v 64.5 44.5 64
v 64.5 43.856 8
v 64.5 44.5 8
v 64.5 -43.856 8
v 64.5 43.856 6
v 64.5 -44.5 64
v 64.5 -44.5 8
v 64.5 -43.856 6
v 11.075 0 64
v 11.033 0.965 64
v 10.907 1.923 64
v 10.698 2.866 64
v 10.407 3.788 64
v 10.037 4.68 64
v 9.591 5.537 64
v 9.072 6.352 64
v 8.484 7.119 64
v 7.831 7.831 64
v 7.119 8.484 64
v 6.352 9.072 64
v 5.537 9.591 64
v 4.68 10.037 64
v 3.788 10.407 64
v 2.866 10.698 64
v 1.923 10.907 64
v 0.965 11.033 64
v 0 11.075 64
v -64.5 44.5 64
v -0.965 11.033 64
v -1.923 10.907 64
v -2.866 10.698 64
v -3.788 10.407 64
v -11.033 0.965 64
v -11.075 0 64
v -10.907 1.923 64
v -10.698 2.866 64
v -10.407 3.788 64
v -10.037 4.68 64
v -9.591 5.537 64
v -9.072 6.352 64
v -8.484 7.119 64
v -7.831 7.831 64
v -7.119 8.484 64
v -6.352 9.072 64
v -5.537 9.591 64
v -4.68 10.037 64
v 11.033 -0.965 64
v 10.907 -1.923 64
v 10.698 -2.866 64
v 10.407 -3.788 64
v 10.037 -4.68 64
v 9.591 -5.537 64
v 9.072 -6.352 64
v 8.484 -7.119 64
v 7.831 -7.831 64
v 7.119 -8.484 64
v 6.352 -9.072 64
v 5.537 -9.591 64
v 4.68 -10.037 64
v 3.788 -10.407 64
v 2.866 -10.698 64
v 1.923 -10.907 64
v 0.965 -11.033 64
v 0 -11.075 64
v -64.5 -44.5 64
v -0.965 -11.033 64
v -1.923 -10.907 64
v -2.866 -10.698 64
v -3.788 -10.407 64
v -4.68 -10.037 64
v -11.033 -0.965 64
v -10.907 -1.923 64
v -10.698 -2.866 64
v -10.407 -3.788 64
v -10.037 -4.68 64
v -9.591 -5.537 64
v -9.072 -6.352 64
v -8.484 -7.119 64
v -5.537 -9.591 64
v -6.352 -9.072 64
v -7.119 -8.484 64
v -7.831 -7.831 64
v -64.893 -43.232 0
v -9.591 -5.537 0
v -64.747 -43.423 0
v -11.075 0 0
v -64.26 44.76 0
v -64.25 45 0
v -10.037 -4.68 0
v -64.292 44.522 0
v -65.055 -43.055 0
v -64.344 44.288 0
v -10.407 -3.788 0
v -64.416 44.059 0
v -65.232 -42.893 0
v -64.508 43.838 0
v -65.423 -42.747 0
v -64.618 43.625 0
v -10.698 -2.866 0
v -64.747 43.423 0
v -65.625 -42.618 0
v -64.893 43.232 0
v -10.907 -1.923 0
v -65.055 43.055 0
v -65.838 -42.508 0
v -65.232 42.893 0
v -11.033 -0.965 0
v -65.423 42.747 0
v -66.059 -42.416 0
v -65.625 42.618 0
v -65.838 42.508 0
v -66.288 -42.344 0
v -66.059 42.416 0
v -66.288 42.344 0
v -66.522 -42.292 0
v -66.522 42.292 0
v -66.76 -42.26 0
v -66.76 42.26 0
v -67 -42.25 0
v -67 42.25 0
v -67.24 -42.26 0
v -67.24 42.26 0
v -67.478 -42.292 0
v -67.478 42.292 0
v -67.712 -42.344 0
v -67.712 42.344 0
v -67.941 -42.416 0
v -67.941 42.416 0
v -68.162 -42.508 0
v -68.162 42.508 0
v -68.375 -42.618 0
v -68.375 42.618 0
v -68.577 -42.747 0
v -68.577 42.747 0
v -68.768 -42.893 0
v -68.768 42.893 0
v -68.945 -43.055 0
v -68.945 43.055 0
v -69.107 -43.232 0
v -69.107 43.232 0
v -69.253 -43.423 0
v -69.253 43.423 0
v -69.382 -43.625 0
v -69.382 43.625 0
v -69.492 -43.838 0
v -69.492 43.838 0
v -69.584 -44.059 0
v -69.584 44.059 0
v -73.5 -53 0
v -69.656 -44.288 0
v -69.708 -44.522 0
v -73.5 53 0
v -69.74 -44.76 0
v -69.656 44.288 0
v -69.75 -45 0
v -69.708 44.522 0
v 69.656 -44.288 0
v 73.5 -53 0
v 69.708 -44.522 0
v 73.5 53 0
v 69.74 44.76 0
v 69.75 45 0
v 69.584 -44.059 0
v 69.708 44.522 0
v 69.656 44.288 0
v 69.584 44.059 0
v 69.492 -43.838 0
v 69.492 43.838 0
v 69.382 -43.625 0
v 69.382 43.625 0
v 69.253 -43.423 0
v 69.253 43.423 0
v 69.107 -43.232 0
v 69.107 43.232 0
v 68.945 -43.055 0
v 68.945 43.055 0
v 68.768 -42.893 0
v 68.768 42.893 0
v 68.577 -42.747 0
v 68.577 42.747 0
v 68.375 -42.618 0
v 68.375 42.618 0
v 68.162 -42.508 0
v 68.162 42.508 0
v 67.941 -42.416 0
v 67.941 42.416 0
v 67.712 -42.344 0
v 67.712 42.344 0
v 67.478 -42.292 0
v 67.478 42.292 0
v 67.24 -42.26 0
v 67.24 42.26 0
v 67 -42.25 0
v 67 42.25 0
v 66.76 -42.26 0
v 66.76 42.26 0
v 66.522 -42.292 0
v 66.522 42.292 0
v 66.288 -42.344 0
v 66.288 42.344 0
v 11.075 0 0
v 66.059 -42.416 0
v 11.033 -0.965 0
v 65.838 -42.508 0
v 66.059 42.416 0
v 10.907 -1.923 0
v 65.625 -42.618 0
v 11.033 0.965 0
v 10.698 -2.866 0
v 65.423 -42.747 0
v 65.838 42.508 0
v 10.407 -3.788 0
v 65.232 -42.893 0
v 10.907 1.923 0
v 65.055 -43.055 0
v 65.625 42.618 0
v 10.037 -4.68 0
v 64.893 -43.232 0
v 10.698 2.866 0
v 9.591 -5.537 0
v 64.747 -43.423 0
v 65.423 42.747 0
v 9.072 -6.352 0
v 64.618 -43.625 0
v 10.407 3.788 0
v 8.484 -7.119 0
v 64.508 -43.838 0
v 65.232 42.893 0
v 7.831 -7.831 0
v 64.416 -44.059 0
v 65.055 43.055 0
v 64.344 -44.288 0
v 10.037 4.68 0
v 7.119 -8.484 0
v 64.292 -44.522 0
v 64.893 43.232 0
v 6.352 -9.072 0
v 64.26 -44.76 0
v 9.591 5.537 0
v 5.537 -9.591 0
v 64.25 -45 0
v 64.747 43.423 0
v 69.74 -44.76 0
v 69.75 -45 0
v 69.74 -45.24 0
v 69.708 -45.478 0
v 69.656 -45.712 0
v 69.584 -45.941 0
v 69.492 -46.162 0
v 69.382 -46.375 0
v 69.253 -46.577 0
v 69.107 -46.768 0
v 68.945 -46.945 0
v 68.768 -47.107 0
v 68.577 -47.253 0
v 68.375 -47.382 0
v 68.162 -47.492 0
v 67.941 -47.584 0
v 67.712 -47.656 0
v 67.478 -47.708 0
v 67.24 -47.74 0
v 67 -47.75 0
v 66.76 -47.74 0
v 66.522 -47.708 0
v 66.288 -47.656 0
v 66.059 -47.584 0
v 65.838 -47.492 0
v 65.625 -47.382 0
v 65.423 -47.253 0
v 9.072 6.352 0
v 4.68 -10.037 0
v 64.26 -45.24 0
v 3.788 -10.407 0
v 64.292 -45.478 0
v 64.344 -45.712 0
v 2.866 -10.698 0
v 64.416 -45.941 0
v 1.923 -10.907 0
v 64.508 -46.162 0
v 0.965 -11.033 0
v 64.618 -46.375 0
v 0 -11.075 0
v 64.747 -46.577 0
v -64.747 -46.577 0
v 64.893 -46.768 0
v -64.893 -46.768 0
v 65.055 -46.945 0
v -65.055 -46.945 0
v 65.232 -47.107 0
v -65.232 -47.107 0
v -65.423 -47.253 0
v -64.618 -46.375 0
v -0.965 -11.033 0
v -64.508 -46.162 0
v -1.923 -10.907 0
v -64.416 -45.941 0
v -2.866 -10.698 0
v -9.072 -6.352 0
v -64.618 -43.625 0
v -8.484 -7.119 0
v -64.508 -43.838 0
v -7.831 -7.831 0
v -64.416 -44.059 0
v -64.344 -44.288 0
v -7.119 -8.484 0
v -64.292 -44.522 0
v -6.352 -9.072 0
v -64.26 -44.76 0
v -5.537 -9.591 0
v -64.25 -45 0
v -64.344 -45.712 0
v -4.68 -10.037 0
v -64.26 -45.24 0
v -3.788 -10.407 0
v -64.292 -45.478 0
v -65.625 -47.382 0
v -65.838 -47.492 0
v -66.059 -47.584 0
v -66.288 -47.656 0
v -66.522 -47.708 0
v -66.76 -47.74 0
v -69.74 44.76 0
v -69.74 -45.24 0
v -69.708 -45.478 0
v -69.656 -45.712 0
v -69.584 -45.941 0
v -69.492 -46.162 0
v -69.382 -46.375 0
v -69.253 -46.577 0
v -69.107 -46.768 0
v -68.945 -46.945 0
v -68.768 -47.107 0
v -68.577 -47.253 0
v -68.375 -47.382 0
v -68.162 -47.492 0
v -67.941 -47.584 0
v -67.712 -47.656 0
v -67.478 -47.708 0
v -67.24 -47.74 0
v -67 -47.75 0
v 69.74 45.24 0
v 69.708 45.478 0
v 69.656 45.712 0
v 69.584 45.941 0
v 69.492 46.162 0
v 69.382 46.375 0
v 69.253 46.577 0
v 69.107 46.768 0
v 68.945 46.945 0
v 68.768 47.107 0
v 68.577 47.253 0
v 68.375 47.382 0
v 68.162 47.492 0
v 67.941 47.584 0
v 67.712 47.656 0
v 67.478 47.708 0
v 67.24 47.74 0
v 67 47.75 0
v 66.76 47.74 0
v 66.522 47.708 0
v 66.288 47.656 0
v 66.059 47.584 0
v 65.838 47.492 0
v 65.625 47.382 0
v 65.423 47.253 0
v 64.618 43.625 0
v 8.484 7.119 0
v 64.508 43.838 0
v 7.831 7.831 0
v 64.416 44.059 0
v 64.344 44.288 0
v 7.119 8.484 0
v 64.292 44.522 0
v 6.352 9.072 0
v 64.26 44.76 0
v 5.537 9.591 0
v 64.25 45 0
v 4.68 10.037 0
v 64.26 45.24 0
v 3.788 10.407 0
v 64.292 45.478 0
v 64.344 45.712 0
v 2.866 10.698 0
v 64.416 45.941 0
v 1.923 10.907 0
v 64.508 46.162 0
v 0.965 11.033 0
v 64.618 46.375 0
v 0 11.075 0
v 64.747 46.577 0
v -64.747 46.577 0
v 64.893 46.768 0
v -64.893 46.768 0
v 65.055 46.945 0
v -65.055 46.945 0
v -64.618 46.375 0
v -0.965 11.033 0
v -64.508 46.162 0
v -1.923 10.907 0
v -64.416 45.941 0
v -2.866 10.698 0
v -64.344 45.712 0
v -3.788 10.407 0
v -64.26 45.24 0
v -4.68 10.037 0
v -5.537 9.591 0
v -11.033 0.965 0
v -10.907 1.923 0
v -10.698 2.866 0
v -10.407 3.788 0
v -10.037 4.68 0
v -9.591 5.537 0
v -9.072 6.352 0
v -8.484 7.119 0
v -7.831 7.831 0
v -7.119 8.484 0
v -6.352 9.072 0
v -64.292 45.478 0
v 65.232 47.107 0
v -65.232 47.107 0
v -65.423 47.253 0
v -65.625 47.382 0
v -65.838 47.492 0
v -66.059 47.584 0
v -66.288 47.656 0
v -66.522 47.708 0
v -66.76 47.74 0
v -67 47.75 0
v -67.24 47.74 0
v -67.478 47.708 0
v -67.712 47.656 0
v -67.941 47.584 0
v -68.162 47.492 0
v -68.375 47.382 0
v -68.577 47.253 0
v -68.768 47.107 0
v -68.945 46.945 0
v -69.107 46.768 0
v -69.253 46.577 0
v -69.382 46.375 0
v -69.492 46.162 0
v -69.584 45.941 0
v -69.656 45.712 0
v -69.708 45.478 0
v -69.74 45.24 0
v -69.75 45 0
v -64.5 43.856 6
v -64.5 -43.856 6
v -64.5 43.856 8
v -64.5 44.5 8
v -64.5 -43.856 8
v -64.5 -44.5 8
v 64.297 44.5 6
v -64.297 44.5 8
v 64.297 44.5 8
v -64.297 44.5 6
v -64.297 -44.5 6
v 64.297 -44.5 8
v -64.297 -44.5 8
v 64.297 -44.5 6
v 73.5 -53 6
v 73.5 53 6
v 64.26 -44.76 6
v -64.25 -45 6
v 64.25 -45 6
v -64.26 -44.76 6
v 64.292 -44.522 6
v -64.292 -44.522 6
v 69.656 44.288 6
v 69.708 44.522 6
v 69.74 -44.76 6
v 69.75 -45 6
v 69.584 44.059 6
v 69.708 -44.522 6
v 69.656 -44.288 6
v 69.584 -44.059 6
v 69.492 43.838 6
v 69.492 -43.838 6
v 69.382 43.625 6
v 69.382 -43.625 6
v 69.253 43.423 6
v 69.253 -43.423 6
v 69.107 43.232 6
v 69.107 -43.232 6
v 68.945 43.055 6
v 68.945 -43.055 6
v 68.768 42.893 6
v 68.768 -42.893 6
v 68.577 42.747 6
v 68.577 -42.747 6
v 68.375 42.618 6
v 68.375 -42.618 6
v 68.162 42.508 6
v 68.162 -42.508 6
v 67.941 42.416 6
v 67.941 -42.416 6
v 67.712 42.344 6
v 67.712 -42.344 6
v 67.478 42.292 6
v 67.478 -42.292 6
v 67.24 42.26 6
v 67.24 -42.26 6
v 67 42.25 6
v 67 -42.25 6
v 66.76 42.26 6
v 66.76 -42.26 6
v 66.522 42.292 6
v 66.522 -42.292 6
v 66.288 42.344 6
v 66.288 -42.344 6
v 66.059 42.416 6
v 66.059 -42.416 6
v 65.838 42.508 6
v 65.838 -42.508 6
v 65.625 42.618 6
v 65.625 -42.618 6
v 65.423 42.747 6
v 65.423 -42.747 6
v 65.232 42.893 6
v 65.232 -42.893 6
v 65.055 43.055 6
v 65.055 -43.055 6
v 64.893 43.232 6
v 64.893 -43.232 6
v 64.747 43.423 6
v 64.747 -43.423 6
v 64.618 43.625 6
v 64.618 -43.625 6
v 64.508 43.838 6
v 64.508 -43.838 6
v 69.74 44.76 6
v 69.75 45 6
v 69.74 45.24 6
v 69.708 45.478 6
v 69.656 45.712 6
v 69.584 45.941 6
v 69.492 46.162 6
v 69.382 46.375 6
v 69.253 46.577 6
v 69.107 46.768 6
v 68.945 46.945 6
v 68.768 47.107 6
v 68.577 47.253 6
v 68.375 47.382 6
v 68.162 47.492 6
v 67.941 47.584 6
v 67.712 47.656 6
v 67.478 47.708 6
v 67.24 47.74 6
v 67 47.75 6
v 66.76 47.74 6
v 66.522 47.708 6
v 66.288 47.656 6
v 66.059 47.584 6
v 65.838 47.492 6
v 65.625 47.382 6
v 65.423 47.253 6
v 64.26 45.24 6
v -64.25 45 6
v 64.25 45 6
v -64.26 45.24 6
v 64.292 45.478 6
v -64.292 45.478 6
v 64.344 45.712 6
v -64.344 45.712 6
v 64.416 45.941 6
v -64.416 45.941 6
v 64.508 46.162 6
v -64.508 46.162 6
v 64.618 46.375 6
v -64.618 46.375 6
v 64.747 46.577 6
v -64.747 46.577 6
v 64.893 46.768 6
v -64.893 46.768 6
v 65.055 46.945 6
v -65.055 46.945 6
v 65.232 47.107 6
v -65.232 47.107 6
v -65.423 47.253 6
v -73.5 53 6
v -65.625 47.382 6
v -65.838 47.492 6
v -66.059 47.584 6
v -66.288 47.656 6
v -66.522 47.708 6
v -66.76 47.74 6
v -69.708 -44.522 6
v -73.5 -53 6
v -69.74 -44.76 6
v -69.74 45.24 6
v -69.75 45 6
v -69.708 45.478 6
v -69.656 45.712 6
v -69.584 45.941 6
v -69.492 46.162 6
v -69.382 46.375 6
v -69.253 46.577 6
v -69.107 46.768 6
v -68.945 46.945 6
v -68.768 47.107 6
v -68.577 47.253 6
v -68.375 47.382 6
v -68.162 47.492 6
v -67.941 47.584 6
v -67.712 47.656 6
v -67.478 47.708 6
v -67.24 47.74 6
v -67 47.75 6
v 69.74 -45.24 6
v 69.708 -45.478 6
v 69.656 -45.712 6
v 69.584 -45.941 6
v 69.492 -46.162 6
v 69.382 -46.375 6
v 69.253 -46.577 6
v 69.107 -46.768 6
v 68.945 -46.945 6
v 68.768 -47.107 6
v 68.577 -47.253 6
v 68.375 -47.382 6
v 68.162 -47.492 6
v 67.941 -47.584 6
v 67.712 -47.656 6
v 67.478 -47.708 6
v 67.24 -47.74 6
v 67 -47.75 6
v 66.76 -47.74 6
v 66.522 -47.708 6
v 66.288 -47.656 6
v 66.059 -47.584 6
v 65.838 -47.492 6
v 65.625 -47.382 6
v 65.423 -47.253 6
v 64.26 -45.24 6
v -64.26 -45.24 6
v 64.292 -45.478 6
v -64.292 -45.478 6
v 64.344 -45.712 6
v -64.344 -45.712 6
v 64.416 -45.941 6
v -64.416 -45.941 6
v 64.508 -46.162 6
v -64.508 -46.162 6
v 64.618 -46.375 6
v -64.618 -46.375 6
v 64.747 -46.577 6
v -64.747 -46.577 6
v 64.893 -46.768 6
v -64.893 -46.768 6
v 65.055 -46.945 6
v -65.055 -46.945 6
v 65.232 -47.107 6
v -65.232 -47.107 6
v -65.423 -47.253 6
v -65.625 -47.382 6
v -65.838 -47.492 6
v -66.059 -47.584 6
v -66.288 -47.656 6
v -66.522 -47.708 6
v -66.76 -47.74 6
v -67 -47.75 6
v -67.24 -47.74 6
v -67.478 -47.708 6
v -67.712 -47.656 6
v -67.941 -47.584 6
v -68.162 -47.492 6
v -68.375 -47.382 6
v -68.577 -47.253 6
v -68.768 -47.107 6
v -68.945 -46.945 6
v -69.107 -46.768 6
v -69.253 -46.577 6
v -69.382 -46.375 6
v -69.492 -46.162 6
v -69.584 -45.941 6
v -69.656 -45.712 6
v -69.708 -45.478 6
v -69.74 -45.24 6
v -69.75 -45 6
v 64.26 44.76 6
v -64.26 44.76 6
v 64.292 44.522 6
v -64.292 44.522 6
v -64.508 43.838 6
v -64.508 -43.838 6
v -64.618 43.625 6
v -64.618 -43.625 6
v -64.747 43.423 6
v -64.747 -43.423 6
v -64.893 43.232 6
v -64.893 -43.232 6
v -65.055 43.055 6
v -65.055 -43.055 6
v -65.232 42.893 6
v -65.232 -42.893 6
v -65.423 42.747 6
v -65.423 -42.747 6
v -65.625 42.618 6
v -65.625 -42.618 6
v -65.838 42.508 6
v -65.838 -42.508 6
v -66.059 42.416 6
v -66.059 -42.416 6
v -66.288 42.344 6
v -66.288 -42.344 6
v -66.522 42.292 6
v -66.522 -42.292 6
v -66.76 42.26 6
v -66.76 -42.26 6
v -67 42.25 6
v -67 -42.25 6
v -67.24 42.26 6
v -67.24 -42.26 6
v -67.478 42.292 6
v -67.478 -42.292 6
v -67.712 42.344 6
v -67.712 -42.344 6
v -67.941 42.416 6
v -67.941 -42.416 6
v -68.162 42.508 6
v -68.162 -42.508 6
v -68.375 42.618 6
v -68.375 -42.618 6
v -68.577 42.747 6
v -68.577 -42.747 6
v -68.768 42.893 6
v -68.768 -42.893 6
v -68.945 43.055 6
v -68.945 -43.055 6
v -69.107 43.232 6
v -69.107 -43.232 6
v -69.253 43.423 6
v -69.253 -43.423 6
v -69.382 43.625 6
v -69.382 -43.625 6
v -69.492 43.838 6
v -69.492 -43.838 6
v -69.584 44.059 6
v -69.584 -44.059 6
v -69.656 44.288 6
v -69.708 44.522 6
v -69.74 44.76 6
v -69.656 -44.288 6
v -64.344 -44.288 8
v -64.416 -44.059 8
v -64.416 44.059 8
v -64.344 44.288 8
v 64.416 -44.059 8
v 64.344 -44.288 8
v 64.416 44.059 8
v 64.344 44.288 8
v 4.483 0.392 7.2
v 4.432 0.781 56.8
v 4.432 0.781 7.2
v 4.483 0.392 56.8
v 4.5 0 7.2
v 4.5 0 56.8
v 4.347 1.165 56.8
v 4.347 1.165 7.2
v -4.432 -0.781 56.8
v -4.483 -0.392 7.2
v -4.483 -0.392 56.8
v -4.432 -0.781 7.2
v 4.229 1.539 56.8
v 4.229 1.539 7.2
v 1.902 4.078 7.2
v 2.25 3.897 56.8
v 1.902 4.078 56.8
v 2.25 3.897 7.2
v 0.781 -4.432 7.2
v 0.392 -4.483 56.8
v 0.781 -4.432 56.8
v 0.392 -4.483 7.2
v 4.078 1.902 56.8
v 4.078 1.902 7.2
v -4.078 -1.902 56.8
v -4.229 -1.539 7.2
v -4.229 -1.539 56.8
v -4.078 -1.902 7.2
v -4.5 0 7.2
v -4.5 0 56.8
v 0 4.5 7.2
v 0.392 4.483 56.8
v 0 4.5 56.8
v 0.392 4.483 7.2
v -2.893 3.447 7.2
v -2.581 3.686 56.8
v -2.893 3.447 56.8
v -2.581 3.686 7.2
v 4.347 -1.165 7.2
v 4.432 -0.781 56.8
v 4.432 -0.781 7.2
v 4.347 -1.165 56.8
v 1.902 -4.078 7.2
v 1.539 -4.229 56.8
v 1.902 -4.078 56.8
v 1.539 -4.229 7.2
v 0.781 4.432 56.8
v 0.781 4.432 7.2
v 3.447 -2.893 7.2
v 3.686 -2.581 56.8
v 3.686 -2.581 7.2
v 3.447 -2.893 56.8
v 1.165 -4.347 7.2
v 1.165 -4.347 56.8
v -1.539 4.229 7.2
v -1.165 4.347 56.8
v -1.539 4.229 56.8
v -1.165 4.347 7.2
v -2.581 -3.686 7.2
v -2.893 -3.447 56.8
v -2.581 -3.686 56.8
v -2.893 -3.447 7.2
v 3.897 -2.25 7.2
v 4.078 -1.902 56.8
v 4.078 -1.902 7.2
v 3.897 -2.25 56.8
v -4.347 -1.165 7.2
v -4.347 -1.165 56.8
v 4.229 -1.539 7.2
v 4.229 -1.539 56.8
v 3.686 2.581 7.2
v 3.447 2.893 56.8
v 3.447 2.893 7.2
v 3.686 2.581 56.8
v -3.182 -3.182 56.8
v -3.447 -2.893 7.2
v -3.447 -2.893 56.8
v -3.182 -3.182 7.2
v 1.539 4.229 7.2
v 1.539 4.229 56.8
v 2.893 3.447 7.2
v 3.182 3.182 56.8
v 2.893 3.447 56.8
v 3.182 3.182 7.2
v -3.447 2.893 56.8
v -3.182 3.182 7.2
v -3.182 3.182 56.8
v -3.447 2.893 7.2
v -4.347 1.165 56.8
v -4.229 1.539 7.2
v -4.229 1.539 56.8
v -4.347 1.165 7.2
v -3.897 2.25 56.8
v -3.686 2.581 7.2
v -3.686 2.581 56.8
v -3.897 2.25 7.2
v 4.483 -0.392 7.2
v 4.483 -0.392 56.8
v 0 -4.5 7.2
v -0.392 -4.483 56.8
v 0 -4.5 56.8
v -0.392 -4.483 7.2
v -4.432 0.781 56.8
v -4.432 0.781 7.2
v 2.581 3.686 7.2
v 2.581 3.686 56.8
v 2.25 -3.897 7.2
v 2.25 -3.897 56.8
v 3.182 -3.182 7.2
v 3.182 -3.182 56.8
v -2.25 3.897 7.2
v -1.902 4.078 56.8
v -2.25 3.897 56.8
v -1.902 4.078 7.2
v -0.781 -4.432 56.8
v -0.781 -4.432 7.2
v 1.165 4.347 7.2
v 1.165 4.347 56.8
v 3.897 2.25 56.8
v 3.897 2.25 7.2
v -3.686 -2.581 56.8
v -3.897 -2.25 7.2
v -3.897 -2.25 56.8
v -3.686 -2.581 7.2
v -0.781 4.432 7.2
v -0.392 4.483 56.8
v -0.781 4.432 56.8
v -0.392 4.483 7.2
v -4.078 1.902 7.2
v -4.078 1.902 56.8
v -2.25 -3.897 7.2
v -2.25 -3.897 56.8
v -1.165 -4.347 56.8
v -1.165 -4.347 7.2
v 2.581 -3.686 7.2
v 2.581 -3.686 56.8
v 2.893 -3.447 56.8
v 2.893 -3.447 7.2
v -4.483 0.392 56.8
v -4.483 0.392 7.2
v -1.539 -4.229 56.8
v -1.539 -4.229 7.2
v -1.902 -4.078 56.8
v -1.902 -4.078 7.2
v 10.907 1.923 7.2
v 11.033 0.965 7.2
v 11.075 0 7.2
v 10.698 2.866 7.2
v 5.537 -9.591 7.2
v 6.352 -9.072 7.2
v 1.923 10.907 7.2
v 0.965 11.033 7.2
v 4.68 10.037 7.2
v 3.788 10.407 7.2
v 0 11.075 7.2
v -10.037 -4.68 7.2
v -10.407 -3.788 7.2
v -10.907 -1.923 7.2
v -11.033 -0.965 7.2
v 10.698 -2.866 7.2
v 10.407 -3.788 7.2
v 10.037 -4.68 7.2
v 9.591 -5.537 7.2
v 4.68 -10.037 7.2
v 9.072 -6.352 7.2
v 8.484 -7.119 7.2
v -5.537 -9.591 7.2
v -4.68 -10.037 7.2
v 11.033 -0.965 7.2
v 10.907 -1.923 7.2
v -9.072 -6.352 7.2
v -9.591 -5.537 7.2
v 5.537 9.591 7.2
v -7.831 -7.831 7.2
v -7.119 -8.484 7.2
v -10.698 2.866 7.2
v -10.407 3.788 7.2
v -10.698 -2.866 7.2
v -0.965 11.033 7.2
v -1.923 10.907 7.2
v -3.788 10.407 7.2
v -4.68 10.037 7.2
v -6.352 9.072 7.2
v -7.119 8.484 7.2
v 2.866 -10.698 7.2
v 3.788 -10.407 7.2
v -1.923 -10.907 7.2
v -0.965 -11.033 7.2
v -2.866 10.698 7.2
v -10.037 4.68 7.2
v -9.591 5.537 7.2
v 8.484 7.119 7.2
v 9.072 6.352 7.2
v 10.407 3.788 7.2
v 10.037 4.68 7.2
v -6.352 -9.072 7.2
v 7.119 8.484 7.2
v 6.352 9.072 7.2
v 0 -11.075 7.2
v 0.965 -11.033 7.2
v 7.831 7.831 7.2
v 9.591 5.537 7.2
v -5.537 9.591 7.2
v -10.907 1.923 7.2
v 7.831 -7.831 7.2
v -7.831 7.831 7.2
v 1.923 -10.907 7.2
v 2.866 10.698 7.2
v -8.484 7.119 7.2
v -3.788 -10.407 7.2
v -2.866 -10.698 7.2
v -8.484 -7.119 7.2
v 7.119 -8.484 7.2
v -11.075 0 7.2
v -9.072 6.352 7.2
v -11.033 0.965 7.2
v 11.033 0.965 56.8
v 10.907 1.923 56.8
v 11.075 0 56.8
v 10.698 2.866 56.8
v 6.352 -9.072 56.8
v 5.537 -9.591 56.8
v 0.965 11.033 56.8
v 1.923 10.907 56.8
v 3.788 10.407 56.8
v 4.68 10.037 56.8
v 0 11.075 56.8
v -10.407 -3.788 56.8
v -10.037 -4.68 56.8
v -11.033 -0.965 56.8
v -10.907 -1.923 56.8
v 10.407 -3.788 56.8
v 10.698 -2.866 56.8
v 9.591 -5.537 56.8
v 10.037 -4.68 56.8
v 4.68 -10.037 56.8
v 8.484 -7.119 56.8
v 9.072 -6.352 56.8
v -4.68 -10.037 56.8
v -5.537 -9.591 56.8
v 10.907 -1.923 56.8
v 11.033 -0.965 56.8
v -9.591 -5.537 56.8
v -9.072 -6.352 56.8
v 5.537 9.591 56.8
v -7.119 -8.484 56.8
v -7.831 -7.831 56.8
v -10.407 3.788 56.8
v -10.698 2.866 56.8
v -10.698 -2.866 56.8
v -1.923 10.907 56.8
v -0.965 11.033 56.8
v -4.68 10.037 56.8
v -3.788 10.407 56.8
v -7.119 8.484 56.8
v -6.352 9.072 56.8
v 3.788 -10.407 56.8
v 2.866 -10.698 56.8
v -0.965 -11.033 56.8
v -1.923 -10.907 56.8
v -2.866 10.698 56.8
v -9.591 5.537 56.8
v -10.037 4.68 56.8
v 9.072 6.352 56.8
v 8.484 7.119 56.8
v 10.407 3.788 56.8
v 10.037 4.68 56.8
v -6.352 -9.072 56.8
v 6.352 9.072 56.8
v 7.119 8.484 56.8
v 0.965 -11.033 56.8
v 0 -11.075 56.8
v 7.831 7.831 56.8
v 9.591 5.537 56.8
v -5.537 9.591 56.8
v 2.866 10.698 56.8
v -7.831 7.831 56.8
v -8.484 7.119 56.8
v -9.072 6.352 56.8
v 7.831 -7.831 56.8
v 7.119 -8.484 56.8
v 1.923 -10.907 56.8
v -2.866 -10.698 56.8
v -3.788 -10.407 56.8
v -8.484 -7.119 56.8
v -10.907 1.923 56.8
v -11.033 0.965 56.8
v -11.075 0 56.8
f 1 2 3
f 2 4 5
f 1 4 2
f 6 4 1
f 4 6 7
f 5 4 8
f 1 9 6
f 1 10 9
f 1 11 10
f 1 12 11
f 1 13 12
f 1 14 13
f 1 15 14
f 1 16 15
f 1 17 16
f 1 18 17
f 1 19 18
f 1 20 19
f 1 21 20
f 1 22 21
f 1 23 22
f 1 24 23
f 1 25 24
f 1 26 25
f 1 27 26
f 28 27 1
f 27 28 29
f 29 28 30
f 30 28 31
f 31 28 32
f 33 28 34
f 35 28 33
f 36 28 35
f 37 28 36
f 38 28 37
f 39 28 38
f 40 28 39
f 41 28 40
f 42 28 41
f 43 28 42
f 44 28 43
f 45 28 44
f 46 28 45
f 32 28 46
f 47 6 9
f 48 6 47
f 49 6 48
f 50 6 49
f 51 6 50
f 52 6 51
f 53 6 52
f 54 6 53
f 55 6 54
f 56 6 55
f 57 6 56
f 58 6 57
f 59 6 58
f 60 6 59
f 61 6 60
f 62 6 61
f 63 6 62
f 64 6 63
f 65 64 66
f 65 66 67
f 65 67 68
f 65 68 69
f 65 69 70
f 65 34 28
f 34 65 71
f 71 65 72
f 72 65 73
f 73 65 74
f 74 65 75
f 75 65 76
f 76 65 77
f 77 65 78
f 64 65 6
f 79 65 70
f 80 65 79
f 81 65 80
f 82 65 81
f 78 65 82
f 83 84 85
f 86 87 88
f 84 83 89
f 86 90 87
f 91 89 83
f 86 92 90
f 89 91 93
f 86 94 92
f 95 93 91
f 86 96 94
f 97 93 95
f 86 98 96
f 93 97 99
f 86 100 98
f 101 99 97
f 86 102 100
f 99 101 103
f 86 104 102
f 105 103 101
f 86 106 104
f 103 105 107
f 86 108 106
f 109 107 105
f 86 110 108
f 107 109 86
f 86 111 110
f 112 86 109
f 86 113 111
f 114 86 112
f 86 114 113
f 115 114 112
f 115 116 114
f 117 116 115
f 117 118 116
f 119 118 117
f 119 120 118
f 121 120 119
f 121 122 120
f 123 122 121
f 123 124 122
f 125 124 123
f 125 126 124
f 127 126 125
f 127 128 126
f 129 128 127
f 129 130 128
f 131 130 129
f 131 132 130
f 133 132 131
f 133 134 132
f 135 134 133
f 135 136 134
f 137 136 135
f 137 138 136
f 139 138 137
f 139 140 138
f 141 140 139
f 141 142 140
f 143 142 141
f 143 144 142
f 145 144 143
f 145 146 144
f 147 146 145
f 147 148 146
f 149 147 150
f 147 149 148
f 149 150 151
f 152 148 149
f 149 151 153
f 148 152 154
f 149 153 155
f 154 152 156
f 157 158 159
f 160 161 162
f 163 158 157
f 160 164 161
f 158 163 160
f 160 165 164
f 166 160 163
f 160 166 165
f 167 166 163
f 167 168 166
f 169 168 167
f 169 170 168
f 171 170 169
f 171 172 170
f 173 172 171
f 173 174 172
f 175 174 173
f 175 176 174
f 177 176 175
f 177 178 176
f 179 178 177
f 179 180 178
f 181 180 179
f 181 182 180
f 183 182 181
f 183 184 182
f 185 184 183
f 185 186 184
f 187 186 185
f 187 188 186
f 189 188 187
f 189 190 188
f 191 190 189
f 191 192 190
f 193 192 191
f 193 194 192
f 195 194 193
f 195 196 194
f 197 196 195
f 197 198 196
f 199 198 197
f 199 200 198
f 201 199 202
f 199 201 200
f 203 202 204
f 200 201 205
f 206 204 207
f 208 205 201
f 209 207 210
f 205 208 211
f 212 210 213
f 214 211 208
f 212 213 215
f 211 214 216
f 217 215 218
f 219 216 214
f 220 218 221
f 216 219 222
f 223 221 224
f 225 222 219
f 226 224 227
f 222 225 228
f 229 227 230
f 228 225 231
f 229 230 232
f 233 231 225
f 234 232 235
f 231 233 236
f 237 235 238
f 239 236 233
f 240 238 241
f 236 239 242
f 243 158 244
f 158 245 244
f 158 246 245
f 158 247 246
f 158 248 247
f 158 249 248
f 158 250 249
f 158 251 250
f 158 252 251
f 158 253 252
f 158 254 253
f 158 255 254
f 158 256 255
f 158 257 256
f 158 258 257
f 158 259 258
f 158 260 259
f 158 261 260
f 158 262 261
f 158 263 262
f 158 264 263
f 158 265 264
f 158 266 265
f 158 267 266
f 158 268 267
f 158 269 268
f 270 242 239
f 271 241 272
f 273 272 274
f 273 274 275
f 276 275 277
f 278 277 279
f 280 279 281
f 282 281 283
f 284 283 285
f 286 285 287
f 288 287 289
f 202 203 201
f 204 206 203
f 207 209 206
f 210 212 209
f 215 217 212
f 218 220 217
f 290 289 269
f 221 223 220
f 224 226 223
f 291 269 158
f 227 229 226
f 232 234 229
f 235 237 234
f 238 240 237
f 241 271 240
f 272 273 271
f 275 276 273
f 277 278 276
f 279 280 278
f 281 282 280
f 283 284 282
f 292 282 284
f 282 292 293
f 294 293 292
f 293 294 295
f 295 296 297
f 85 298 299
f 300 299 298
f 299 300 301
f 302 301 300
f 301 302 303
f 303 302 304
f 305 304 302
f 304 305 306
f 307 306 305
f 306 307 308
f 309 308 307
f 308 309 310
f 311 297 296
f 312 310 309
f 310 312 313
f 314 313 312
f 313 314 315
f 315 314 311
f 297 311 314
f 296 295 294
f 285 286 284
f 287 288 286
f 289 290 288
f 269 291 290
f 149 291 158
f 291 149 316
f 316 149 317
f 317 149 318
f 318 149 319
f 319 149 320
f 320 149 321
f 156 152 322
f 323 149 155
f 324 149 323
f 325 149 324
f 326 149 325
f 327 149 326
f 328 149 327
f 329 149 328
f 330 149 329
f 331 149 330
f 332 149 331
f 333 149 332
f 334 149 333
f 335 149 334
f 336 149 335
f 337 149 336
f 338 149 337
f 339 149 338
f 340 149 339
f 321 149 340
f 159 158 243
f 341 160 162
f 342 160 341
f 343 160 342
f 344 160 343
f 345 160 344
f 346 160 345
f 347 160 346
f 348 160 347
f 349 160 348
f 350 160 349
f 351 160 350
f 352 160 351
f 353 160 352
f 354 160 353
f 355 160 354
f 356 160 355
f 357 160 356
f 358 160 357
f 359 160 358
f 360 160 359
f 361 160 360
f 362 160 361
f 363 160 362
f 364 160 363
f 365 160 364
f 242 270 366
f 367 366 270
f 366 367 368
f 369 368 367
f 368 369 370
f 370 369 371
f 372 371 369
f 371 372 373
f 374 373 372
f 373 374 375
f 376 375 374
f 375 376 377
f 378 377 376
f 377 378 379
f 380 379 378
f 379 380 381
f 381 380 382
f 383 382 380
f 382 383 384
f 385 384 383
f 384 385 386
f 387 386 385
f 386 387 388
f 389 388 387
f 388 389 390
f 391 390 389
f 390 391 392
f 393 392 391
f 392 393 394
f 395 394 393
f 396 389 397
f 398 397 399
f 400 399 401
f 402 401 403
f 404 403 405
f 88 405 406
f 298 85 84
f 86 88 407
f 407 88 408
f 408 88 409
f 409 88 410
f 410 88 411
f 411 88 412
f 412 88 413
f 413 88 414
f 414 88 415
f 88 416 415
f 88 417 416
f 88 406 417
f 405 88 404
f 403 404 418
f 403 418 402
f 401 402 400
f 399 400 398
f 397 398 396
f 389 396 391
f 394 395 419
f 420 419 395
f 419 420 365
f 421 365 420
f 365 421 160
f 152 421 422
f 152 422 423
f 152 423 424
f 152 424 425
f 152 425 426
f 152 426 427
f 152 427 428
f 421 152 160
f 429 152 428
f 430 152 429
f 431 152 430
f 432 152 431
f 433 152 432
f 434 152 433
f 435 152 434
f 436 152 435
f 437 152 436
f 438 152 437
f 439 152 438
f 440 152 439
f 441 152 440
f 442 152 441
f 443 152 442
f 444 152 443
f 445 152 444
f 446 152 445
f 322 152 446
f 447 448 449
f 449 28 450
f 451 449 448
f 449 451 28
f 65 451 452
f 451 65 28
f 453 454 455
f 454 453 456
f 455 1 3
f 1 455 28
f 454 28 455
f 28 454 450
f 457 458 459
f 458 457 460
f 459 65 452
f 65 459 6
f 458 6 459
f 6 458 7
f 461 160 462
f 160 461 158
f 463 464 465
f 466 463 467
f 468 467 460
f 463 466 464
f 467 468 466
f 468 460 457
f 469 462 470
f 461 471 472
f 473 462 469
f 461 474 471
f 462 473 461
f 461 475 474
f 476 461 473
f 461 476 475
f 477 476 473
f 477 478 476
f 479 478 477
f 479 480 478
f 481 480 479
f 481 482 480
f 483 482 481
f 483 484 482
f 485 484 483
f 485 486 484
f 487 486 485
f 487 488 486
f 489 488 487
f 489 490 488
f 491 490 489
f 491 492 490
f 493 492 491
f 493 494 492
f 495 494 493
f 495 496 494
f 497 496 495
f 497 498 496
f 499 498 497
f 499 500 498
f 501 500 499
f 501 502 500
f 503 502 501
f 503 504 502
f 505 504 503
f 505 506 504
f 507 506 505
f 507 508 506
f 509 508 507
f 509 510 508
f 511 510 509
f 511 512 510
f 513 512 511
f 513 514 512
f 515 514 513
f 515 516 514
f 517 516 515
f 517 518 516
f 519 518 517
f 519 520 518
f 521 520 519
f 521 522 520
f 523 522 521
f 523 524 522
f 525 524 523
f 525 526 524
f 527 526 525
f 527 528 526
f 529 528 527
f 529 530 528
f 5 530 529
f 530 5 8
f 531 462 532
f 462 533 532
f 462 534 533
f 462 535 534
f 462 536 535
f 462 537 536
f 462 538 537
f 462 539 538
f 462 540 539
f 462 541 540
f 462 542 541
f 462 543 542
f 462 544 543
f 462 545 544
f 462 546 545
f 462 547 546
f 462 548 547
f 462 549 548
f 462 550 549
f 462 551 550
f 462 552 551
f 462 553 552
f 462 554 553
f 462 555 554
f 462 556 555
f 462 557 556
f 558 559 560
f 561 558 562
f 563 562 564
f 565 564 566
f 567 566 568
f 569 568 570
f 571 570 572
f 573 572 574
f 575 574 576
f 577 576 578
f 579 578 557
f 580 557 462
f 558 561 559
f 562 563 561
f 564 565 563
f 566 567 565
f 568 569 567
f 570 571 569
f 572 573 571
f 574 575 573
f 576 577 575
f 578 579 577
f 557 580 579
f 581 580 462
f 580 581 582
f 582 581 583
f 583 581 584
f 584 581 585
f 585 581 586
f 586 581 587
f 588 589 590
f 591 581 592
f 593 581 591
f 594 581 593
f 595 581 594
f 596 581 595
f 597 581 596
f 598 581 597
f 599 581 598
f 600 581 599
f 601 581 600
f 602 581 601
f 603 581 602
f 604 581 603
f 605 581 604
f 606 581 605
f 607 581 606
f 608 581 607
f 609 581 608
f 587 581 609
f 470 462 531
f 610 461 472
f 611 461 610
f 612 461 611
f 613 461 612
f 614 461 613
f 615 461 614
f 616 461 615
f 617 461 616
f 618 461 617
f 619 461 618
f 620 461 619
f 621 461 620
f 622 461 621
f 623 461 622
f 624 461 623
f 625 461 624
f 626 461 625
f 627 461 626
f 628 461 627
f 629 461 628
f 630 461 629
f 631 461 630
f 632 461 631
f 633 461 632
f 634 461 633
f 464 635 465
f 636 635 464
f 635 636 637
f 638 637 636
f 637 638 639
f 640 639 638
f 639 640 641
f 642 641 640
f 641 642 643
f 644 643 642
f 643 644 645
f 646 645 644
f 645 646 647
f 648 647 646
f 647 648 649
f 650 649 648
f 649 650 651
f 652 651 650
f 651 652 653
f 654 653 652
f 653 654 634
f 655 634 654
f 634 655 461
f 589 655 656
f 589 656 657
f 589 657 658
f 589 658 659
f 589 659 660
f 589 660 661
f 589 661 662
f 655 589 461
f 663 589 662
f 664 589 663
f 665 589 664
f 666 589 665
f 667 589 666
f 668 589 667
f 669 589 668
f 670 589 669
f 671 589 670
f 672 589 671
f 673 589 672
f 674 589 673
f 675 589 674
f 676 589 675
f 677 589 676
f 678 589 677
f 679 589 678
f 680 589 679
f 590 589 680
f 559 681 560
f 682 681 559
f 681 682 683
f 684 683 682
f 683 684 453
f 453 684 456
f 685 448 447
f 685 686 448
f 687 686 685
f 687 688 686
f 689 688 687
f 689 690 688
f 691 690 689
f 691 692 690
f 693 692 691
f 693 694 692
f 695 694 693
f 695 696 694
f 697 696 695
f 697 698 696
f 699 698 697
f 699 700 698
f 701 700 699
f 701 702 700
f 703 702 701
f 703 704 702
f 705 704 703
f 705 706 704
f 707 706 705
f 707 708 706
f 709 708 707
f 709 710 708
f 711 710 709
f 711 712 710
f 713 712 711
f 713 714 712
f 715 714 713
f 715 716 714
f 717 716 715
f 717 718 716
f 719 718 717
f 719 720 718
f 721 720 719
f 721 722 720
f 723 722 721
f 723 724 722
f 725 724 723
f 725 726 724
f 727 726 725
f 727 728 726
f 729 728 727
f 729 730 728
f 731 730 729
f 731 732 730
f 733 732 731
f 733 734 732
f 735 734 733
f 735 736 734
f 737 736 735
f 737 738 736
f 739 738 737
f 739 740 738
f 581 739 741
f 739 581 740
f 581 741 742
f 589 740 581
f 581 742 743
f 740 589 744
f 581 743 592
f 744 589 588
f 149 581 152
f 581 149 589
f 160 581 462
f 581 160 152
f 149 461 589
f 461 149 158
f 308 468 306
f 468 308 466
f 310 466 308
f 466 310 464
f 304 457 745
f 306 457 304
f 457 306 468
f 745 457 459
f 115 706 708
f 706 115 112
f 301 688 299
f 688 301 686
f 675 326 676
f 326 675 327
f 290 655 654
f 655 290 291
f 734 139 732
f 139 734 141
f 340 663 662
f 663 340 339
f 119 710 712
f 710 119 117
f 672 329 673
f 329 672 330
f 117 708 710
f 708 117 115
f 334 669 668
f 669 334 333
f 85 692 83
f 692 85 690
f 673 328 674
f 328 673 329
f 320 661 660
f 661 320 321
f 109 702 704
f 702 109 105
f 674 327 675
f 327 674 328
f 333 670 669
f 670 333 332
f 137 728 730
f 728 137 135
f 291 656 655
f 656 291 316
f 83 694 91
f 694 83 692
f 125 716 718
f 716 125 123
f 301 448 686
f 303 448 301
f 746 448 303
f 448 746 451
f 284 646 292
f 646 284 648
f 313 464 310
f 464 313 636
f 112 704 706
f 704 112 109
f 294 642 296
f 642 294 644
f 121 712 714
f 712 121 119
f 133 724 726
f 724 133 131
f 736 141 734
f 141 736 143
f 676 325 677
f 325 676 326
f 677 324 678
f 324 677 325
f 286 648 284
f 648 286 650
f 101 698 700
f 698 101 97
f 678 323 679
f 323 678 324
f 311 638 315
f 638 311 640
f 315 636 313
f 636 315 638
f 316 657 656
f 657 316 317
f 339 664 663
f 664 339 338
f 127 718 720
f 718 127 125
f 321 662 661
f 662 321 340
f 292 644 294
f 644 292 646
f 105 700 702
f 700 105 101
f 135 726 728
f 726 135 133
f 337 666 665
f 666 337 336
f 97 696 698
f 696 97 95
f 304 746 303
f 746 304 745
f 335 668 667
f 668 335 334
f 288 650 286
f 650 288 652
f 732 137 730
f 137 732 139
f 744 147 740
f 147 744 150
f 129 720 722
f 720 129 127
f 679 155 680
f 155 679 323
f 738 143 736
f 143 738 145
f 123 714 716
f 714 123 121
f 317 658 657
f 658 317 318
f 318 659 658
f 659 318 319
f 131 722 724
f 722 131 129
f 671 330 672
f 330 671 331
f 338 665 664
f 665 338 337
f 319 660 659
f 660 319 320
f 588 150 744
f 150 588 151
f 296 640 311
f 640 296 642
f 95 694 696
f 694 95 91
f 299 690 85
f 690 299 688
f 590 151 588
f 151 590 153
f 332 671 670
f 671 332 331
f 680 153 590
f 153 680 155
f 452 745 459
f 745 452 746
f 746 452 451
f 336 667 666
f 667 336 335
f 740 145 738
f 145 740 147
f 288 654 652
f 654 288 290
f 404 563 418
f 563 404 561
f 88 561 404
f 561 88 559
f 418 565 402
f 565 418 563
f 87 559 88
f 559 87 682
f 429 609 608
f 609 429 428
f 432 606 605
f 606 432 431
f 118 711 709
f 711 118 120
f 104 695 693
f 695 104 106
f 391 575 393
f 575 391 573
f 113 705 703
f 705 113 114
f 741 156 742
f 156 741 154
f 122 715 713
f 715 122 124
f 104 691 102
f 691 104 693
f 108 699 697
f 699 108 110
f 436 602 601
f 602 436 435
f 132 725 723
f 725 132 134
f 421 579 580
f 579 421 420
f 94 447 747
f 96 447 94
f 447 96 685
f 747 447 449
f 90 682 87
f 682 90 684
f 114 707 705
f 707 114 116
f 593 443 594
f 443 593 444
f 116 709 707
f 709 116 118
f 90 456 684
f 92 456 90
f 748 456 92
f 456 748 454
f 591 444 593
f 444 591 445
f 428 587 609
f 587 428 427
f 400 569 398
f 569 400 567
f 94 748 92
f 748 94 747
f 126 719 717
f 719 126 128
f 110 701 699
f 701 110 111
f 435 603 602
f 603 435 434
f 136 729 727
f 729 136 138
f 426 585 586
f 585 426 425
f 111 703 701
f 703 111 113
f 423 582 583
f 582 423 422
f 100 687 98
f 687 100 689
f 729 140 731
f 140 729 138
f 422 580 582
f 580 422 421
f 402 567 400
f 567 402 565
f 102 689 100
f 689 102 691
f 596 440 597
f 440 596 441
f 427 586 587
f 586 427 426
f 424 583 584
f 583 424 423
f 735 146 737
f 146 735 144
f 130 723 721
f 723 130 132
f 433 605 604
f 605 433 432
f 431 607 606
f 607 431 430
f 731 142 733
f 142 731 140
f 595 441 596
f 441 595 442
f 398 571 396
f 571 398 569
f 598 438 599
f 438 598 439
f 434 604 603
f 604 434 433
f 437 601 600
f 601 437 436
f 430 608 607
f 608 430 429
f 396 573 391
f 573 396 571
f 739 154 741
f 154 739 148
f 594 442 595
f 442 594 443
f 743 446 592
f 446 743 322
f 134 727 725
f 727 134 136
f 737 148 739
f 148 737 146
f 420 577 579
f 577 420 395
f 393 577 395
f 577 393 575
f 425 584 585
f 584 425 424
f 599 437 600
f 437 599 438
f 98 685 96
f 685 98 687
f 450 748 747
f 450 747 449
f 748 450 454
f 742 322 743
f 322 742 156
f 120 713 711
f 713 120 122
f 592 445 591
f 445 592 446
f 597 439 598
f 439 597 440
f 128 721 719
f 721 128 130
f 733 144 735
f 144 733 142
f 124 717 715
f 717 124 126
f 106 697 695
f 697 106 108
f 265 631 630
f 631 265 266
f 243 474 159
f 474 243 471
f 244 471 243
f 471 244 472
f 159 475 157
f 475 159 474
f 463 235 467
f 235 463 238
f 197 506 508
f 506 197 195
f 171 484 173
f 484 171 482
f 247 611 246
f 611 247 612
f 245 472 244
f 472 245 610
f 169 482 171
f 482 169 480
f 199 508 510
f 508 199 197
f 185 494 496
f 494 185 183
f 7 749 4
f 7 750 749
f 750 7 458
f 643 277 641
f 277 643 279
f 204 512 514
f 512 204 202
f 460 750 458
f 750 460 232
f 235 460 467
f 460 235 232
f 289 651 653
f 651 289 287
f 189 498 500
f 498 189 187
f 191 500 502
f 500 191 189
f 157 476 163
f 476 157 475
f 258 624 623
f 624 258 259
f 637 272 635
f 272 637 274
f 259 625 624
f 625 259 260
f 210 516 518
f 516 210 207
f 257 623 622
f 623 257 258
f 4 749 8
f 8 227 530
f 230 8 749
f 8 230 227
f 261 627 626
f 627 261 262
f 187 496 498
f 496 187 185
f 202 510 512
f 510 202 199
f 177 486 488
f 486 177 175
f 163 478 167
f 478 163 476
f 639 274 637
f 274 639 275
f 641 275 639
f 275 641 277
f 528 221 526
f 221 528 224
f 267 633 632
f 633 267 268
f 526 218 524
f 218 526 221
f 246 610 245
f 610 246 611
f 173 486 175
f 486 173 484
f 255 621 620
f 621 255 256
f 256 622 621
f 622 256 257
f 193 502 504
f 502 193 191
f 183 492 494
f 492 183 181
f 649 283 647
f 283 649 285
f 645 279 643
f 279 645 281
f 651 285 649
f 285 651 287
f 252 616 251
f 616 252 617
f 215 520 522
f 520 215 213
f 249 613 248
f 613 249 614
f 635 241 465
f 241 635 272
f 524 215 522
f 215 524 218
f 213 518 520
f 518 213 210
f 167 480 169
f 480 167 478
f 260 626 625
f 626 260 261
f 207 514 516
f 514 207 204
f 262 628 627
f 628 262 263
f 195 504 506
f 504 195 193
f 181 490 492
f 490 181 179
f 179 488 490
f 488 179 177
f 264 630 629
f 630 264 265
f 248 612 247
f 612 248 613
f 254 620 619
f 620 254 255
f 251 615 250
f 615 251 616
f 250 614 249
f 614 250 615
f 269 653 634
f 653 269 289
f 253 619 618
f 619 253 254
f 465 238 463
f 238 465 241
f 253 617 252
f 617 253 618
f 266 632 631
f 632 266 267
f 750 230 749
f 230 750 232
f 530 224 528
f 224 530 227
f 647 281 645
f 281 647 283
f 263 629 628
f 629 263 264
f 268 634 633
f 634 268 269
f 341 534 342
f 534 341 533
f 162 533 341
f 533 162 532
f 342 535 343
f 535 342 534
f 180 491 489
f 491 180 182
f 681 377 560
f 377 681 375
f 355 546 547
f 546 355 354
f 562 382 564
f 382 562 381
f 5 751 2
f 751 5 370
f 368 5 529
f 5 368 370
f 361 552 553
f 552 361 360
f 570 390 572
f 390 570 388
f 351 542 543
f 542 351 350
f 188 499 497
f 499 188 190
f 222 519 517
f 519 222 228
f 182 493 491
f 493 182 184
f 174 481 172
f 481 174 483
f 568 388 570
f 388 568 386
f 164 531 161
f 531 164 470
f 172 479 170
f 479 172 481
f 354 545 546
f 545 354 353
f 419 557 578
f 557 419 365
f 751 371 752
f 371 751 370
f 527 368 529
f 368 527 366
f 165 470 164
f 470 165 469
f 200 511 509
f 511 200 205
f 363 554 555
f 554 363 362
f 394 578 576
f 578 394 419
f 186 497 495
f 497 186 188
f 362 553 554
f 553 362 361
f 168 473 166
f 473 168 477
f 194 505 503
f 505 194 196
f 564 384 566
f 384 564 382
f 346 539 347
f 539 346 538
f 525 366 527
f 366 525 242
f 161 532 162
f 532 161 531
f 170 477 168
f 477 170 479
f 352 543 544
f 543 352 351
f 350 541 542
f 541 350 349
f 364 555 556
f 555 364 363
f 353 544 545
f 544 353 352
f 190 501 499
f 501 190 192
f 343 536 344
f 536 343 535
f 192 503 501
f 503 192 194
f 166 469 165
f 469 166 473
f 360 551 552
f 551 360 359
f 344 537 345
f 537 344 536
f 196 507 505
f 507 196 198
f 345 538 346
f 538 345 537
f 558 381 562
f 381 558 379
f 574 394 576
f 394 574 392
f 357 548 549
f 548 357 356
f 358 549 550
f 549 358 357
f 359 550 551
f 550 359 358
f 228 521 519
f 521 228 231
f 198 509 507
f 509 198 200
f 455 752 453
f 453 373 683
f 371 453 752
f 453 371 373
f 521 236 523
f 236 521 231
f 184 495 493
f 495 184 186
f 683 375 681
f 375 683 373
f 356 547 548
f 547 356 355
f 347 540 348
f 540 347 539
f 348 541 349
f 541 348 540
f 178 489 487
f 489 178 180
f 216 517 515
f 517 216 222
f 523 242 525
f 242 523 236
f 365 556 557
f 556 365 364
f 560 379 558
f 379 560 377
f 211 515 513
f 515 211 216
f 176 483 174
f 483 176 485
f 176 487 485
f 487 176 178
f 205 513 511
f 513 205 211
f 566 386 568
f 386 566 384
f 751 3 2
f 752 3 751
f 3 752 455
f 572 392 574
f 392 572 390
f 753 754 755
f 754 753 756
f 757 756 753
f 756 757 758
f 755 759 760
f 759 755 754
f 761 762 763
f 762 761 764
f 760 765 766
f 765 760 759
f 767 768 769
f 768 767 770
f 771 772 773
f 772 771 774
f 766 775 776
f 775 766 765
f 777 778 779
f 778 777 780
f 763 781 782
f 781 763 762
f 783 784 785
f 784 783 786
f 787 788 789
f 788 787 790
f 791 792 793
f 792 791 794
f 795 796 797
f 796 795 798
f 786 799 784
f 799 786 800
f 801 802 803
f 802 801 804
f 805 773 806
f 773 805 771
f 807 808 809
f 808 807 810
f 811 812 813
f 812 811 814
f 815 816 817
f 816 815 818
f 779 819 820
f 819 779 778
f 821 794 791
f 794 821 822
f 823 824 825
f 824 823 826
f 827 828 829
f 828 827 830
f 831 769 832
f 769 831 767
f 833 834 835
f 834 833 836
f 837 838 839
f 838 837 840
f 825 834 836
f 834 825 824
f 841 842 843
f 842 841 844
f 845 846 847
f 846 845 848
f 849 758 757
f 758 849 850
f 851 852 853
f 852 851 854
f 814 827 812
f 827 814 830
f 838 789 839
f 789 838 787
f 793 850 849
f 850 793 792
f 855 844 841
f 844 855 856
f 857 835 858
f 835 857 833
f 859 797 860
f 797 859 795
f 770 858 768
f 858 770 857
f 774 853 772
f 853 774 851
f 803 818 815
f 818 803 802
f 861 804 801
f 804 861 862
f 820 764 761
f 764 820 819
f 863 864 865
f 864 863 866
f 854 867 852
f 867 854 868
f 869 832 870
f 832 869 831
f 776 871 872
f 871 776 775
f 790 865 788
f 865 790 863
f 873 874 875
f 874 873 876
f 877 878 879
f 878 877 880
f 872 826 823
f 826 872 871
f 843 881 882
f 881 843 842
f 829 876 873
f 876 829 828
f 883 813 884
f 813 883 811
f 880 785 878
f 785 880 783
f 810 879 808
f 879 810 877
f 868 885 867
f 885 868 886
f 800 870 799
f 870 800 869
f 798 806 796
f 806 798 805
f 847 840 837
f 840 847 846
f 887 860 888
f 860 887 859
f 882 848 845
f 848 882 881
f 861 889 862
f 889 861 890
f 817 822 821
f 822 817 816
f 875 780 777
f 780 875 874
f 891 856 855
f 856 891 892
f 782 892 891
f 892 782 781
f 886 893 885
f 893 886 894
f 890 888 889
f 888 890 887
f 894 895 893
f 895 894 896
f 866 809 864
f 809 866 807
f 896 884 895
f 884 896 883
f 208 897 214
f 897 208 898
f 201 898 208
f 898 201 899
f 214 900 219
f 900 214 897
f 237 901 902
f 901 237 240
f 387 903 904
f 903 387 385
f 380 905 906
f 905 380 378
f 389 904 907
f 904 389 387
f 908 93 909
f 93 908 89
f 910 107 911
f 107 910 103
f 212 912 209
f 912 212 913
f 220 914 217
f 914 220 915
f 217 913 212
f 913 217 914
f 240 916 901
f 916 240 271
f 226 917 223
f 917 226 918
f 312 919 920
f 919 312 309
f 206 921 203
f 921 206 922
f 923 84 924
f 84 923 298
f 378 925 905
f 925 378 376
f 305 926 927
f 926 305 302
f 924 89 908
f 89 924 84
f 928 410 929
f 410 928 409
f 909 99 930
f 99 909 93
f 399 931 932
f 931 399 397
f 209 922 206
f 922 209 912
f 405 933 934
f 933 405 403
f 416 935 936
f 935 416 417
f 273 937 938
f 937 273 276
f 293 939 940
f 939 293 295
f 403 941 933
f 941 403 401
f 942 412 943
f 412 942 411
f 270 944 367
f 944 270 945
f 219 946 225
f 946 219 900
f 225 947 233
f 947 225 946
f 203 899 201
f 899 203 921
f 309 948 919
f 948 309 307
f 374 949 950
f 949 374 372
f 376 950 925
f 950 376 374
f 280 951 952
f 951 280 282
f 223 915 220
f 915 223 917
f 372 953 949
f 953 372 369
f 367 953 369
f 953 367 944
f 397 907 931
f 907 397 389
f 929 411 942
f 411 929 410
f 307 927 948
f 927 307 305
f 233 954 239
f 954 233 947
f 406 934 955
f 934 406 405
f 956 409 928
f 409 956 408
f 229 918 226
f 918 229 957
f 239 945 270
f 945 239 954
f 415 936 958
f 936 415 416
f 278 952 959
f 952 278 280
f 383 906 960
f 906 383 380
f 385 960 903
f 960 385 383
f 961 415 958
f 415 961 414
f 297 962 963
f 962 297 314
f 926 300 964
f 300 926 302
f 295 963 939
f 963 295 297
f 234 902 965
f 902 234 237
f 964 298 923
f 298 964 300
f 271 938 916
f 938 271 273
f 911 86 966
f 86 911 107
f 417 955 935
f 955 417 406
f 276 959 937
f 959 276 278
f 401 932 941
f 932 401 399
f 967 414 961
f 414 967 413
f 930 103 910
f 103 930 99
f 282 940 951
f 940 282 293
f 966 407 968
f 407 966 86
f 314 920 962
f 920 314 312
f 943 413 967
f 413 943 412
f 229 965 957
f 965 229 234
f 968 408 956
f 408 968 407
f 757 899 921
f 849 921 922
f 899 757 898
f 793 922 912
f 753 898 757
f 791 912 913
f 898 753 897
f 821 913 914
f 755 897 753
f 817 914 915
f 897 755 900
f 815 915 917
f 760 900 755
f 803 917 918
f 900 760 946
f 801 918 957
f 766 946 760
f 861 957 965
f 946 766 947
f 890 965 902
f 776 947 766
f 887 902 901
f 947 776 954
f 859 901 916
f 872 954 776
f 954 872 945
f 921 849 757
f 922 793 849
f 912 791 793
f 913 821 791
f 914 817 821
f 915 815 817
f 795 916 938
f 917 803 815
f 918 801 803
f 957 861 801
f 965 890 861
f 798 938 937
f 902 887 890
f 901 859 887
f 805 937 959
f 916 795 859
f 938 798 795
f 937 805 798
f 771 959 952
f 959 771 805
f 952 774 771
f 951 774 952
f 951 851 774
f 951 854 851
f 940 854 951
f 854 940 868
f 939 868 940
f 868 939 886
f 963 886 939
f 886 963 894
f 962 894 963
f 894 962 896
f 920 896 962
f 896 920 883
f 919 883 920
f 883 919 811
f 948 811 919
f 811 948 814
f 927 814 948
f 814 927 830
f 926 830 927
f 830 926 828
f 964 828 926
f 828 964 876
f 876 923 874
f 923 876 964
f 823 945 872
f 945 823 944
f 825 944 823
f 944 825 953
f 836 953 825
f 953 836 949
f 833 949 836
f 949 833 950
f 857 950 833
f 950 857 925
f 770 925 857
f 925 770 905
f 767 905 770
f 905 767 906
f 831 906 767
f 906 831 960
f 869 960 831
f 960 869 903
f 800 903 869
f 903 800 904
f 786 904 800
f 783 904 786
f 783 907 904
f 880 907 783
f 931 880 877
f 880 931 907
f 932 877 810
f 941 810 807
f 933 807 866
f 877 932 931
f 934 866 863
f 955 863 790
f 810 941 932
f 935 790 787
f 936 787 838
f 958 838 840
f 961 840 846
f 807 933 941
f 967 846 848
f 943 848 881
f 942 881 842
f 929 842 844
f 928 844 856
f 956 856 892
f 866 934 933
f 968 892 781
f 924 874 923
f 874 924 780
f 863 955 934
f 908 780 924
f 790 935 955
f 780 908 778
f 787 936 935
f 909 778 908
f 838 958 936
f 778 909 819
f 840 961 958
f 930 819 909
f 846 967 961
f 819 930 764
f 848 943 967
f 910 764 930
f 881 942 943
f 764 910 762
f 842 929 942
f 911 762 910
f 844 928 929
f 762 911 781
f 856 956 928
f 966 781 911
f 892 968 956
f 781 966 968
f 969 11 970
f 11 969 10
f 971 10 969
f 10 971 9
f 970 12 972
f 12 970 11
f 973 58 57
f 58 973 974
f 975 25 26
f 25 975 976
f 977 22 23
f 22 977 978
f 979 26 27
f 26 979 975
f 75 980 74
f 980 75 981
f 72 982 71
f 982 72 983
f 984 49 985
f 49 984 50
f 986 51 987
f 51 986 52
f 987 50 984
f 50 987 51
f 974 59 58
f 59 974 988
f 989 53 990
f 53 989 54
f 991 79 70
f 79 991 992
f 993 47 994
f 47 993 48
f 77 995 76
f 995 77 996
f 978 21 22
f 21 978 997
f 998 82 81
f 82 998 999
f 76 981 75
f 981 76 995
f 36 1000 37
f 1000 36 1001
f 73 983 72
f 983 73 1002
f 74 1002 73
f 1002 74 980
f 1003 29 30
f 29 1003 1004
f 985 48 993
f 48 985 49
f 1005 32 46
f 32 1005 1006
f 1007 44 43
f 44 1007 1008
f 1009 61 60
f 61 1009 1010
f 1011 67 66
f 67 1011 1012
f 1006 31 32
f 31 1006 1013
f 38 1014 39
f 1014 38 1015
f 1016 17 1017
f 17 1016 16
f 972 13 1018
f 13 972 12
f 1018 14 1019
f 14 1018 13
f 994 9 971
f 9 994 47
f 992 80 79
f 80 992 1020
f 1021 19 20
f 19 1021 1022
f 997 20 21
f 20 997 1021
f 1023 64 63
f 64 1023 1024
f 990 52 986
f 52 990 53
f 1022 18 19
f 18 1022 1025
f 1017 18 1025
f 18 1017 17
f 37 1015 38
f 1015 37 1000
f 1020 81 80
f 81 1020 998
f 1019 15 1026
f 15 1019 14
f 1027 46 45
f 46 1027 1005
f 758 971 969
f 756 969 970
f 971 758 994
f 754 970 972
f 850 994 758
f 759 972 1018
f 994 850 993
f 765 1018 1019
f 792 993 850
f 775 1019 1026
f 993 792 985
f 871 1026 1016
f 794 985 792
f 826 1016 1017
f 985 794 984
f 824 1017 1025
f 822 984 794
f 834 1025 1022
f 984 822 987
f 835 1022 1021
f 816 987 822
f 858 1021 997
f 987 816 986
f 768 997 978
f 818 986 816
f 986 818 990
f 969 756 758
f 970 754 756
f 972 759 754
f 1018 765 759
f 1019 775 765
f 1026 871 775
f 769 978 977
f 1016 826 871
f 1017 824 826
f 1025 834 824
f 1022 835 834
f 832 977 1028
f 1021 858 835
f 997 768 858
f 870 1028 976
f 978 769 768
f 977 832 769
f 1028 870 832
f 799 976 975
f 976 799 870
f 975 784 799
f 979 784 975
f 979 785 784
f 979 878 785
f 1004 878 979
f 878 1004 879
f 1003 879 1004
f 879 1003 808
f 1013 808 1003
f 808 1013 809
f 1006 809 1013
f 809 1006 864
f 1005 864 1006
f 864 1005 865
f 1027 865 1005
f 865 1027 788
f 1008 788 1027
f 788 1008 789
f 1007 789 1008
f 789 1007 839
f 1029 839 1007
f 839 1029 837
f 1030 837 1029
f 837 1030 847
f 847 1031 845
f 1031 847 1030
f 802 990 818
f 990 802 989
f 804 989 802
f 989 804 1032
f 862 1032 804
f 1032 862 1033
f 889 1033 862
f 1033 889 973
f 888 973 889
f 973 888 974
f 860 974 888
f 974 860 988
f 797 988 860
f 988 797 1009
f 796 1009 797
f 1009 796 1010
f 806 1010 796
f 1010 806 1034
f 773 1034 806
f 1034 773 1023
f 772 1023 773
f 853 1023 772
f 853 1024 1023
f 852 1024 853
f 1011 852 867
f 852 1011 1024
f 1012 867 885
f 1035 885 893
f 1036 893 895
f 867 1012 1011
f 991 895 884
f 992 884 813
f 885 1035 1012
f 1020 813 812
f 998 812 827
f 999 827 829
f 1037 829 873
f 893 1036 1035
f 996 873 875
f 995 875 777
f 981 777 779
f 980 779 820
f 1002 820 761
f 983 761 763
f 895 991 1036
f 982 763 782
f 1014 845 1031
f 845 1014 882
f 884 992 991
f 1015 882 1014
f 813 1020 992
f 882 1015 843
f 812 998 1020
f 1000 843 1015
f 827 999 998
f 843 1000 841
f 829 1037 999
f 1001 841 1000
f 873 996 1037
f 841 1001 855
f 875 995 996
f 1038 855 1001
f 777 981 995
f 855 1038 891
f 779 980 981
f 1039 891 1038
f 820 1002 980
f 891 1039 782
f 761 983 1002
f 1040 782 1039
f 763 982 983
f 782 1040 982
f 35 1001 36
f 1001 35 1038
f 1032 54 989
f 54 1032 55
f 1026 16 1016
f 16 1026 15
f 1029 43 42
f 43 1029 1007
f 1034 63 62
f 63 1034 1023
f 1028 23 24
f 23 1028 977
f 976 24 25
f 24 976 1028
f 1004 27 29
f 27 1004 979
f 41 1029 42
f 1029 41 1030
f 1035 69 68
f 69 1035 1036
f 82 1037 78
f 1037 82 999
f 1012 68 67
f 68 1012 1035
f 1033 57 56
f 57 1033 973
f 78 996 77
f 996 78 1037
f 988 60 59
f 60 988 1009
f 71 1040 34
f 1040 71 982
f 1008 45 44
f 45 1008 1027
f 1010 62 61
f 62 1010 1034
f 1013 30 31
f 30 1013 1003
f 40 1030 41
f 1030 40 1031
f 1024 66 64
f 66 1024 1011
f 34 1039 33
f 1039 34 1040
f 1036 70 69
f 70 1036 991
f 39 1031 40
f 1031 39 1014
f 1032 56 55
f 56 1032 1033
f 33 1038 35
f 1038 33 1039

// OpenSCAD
// Dimensions in mm. Print the unloaded teaching fixture in the indicated colors.
// Plate top is Z=0. The rotor axis is the XY origin. No spring mount is provided.
part="housing";
$fn=72;
pin=[-108,10.9]; tray=[-168,0]; shaft=8.2;
module zhole(x,y,z,h,d){translate([x,y,z]) cylinder(d=d,h=h);}
module block(x,y,z,dx,dy,dz){translate([x-dx/2,y-dy/2,z])cube([dx,dy,dz]);}
module housing(){
 difference(){
  union(){block(0,0,0,129,89,64);block(0,0,0,147,106,6);}
  zhole(0,0,-1,70,9.0);zhole(0,0,-1,8.2,22.15);zhole(0,0,56.8,8,22.15);
  for(x=[-67,67],y=[-45,45]) zhole(x,y,-1,9,5.5);
 }
}
module lever(){
 difference(){
  union(){
   cylinder(d=28,h=10);
   rotate([0,0,45])block(78,0,0,144,9,9);
   block(-57,0,-1,114,12,13);
  }
  zhole(0,0,-2,16,shaft);
  translate([0,-16,5]) rotate([-90,0,0]) cylinder(d=3.3,h=16);
 }
}
module crank(){
 difference(){
  union(){
   cylinder(d=27,h=11);
   block(10,0,0,12,302,10);
   for(y=[-151,151]) translate([10,y,0]) cylinder(d=20,h=10);
  }
  zhole(0,0,-1,14,shaft);
  translate([-14,0,5])rotate([0,90,0])cylinder(d=3.3,h=14);
  for(y=[-151,151]) zhole(10,y,-1,14,5.4);
 }
}
module knob(){difference(){cylinder(d=18,h=41);zhole(0,0,-1,44,5.3);zhole(0,0,35,7,9.5);}}
module pin_handle(){
 difference(){
  block(0,4.5,0,27,9,21);
  zhole(0,0,-1,9.5,10.35);zhole(0,0,8.5,5.0,18.4);
  for(x=[-9.8,9.8])translate([x,-1,17.1])rotate([-90,0,0])cylinder(d=2.7,h=12);
 }
}
module guide(){
 difference(){
  union(){
   block(0,0,0,40,42,6);block(0,0,6,27,27,65);
   block(0,0,97,27,27,8);block(-18,0,6,10,20,99);
   block(-10,0,97,20,20,8);
  }
  zhole(0,0,47,61,11.0);
  for(y=[-16.5,16.5]) zhole(0,y,-1,9,4.5);
 }
}
module receiving_tray(){
 difference(){block(0,0,0,100,115,24);block(0,0,12,96,111,13);}
 translate([0,0,12])difference(){cylinder(d=50,h=53);translate([0,0,-1])cylinder(d=38,h=55);}
}
module gauge_base(){
 difference(){block(0,0,0,29,65,8);block(0,0,3,17,53,7);
  for(y=[-28,28])zhole(0,y,-1,12,3.5);}
}
module witness_slide(){
 union(){block(0,0,0,15.7,22,3);block(0,-5,3,3,4,30);block(0,-5,28,22,4,12);}
}
module pointer(){union(){block(0,0,0,15.7,18,3);block(0,0,3,8,6,9);block(0,-3,4,34,3,3);}}
module pedestal(h){difference(){block(0,0,0,29,65,h);for(y=[-28,28])zhole(0,y,-1,h+2,3.5);}}
module panel_template(){
 difference(){translate([-245,-205,-1])cube([490,410,1]);
  for(x=[-67,67],y=[-45,45])zhole(x,y,-2,4,5.5);
  for(y=[-16.5,16.5])zhole(pin.x,pin.y+y,-2,4,4.5);
  for(x=[-205,0,205],y=[-155,155])zhole(x,y,-2,4,8.4);
  for(p=[[145,-39],[107,-22]],y=[-28,28])zhole(p.x,p.y+y,-2,4,3.5);
 }
}
if(part=="housing")housing();
if(part=="lever")translate([0,0,1])lever();
if(part=="crank")crank();
if(part=="knob")knob();
if(part=="pin_handle")pin_handle();
if(part=="guide")guide();
if(part=="tray")receiving_tray();
if(part=="witness_rail")gauge_base();
if(part=="wrist_flag")witness_slide();
if(part=="pointer")pointer();
if(part=="wrist_pedestal")pedestal(75);
if(part=="pointer_pedestal")pedestal(71);
if(part=="plate")projection()panel_template();
